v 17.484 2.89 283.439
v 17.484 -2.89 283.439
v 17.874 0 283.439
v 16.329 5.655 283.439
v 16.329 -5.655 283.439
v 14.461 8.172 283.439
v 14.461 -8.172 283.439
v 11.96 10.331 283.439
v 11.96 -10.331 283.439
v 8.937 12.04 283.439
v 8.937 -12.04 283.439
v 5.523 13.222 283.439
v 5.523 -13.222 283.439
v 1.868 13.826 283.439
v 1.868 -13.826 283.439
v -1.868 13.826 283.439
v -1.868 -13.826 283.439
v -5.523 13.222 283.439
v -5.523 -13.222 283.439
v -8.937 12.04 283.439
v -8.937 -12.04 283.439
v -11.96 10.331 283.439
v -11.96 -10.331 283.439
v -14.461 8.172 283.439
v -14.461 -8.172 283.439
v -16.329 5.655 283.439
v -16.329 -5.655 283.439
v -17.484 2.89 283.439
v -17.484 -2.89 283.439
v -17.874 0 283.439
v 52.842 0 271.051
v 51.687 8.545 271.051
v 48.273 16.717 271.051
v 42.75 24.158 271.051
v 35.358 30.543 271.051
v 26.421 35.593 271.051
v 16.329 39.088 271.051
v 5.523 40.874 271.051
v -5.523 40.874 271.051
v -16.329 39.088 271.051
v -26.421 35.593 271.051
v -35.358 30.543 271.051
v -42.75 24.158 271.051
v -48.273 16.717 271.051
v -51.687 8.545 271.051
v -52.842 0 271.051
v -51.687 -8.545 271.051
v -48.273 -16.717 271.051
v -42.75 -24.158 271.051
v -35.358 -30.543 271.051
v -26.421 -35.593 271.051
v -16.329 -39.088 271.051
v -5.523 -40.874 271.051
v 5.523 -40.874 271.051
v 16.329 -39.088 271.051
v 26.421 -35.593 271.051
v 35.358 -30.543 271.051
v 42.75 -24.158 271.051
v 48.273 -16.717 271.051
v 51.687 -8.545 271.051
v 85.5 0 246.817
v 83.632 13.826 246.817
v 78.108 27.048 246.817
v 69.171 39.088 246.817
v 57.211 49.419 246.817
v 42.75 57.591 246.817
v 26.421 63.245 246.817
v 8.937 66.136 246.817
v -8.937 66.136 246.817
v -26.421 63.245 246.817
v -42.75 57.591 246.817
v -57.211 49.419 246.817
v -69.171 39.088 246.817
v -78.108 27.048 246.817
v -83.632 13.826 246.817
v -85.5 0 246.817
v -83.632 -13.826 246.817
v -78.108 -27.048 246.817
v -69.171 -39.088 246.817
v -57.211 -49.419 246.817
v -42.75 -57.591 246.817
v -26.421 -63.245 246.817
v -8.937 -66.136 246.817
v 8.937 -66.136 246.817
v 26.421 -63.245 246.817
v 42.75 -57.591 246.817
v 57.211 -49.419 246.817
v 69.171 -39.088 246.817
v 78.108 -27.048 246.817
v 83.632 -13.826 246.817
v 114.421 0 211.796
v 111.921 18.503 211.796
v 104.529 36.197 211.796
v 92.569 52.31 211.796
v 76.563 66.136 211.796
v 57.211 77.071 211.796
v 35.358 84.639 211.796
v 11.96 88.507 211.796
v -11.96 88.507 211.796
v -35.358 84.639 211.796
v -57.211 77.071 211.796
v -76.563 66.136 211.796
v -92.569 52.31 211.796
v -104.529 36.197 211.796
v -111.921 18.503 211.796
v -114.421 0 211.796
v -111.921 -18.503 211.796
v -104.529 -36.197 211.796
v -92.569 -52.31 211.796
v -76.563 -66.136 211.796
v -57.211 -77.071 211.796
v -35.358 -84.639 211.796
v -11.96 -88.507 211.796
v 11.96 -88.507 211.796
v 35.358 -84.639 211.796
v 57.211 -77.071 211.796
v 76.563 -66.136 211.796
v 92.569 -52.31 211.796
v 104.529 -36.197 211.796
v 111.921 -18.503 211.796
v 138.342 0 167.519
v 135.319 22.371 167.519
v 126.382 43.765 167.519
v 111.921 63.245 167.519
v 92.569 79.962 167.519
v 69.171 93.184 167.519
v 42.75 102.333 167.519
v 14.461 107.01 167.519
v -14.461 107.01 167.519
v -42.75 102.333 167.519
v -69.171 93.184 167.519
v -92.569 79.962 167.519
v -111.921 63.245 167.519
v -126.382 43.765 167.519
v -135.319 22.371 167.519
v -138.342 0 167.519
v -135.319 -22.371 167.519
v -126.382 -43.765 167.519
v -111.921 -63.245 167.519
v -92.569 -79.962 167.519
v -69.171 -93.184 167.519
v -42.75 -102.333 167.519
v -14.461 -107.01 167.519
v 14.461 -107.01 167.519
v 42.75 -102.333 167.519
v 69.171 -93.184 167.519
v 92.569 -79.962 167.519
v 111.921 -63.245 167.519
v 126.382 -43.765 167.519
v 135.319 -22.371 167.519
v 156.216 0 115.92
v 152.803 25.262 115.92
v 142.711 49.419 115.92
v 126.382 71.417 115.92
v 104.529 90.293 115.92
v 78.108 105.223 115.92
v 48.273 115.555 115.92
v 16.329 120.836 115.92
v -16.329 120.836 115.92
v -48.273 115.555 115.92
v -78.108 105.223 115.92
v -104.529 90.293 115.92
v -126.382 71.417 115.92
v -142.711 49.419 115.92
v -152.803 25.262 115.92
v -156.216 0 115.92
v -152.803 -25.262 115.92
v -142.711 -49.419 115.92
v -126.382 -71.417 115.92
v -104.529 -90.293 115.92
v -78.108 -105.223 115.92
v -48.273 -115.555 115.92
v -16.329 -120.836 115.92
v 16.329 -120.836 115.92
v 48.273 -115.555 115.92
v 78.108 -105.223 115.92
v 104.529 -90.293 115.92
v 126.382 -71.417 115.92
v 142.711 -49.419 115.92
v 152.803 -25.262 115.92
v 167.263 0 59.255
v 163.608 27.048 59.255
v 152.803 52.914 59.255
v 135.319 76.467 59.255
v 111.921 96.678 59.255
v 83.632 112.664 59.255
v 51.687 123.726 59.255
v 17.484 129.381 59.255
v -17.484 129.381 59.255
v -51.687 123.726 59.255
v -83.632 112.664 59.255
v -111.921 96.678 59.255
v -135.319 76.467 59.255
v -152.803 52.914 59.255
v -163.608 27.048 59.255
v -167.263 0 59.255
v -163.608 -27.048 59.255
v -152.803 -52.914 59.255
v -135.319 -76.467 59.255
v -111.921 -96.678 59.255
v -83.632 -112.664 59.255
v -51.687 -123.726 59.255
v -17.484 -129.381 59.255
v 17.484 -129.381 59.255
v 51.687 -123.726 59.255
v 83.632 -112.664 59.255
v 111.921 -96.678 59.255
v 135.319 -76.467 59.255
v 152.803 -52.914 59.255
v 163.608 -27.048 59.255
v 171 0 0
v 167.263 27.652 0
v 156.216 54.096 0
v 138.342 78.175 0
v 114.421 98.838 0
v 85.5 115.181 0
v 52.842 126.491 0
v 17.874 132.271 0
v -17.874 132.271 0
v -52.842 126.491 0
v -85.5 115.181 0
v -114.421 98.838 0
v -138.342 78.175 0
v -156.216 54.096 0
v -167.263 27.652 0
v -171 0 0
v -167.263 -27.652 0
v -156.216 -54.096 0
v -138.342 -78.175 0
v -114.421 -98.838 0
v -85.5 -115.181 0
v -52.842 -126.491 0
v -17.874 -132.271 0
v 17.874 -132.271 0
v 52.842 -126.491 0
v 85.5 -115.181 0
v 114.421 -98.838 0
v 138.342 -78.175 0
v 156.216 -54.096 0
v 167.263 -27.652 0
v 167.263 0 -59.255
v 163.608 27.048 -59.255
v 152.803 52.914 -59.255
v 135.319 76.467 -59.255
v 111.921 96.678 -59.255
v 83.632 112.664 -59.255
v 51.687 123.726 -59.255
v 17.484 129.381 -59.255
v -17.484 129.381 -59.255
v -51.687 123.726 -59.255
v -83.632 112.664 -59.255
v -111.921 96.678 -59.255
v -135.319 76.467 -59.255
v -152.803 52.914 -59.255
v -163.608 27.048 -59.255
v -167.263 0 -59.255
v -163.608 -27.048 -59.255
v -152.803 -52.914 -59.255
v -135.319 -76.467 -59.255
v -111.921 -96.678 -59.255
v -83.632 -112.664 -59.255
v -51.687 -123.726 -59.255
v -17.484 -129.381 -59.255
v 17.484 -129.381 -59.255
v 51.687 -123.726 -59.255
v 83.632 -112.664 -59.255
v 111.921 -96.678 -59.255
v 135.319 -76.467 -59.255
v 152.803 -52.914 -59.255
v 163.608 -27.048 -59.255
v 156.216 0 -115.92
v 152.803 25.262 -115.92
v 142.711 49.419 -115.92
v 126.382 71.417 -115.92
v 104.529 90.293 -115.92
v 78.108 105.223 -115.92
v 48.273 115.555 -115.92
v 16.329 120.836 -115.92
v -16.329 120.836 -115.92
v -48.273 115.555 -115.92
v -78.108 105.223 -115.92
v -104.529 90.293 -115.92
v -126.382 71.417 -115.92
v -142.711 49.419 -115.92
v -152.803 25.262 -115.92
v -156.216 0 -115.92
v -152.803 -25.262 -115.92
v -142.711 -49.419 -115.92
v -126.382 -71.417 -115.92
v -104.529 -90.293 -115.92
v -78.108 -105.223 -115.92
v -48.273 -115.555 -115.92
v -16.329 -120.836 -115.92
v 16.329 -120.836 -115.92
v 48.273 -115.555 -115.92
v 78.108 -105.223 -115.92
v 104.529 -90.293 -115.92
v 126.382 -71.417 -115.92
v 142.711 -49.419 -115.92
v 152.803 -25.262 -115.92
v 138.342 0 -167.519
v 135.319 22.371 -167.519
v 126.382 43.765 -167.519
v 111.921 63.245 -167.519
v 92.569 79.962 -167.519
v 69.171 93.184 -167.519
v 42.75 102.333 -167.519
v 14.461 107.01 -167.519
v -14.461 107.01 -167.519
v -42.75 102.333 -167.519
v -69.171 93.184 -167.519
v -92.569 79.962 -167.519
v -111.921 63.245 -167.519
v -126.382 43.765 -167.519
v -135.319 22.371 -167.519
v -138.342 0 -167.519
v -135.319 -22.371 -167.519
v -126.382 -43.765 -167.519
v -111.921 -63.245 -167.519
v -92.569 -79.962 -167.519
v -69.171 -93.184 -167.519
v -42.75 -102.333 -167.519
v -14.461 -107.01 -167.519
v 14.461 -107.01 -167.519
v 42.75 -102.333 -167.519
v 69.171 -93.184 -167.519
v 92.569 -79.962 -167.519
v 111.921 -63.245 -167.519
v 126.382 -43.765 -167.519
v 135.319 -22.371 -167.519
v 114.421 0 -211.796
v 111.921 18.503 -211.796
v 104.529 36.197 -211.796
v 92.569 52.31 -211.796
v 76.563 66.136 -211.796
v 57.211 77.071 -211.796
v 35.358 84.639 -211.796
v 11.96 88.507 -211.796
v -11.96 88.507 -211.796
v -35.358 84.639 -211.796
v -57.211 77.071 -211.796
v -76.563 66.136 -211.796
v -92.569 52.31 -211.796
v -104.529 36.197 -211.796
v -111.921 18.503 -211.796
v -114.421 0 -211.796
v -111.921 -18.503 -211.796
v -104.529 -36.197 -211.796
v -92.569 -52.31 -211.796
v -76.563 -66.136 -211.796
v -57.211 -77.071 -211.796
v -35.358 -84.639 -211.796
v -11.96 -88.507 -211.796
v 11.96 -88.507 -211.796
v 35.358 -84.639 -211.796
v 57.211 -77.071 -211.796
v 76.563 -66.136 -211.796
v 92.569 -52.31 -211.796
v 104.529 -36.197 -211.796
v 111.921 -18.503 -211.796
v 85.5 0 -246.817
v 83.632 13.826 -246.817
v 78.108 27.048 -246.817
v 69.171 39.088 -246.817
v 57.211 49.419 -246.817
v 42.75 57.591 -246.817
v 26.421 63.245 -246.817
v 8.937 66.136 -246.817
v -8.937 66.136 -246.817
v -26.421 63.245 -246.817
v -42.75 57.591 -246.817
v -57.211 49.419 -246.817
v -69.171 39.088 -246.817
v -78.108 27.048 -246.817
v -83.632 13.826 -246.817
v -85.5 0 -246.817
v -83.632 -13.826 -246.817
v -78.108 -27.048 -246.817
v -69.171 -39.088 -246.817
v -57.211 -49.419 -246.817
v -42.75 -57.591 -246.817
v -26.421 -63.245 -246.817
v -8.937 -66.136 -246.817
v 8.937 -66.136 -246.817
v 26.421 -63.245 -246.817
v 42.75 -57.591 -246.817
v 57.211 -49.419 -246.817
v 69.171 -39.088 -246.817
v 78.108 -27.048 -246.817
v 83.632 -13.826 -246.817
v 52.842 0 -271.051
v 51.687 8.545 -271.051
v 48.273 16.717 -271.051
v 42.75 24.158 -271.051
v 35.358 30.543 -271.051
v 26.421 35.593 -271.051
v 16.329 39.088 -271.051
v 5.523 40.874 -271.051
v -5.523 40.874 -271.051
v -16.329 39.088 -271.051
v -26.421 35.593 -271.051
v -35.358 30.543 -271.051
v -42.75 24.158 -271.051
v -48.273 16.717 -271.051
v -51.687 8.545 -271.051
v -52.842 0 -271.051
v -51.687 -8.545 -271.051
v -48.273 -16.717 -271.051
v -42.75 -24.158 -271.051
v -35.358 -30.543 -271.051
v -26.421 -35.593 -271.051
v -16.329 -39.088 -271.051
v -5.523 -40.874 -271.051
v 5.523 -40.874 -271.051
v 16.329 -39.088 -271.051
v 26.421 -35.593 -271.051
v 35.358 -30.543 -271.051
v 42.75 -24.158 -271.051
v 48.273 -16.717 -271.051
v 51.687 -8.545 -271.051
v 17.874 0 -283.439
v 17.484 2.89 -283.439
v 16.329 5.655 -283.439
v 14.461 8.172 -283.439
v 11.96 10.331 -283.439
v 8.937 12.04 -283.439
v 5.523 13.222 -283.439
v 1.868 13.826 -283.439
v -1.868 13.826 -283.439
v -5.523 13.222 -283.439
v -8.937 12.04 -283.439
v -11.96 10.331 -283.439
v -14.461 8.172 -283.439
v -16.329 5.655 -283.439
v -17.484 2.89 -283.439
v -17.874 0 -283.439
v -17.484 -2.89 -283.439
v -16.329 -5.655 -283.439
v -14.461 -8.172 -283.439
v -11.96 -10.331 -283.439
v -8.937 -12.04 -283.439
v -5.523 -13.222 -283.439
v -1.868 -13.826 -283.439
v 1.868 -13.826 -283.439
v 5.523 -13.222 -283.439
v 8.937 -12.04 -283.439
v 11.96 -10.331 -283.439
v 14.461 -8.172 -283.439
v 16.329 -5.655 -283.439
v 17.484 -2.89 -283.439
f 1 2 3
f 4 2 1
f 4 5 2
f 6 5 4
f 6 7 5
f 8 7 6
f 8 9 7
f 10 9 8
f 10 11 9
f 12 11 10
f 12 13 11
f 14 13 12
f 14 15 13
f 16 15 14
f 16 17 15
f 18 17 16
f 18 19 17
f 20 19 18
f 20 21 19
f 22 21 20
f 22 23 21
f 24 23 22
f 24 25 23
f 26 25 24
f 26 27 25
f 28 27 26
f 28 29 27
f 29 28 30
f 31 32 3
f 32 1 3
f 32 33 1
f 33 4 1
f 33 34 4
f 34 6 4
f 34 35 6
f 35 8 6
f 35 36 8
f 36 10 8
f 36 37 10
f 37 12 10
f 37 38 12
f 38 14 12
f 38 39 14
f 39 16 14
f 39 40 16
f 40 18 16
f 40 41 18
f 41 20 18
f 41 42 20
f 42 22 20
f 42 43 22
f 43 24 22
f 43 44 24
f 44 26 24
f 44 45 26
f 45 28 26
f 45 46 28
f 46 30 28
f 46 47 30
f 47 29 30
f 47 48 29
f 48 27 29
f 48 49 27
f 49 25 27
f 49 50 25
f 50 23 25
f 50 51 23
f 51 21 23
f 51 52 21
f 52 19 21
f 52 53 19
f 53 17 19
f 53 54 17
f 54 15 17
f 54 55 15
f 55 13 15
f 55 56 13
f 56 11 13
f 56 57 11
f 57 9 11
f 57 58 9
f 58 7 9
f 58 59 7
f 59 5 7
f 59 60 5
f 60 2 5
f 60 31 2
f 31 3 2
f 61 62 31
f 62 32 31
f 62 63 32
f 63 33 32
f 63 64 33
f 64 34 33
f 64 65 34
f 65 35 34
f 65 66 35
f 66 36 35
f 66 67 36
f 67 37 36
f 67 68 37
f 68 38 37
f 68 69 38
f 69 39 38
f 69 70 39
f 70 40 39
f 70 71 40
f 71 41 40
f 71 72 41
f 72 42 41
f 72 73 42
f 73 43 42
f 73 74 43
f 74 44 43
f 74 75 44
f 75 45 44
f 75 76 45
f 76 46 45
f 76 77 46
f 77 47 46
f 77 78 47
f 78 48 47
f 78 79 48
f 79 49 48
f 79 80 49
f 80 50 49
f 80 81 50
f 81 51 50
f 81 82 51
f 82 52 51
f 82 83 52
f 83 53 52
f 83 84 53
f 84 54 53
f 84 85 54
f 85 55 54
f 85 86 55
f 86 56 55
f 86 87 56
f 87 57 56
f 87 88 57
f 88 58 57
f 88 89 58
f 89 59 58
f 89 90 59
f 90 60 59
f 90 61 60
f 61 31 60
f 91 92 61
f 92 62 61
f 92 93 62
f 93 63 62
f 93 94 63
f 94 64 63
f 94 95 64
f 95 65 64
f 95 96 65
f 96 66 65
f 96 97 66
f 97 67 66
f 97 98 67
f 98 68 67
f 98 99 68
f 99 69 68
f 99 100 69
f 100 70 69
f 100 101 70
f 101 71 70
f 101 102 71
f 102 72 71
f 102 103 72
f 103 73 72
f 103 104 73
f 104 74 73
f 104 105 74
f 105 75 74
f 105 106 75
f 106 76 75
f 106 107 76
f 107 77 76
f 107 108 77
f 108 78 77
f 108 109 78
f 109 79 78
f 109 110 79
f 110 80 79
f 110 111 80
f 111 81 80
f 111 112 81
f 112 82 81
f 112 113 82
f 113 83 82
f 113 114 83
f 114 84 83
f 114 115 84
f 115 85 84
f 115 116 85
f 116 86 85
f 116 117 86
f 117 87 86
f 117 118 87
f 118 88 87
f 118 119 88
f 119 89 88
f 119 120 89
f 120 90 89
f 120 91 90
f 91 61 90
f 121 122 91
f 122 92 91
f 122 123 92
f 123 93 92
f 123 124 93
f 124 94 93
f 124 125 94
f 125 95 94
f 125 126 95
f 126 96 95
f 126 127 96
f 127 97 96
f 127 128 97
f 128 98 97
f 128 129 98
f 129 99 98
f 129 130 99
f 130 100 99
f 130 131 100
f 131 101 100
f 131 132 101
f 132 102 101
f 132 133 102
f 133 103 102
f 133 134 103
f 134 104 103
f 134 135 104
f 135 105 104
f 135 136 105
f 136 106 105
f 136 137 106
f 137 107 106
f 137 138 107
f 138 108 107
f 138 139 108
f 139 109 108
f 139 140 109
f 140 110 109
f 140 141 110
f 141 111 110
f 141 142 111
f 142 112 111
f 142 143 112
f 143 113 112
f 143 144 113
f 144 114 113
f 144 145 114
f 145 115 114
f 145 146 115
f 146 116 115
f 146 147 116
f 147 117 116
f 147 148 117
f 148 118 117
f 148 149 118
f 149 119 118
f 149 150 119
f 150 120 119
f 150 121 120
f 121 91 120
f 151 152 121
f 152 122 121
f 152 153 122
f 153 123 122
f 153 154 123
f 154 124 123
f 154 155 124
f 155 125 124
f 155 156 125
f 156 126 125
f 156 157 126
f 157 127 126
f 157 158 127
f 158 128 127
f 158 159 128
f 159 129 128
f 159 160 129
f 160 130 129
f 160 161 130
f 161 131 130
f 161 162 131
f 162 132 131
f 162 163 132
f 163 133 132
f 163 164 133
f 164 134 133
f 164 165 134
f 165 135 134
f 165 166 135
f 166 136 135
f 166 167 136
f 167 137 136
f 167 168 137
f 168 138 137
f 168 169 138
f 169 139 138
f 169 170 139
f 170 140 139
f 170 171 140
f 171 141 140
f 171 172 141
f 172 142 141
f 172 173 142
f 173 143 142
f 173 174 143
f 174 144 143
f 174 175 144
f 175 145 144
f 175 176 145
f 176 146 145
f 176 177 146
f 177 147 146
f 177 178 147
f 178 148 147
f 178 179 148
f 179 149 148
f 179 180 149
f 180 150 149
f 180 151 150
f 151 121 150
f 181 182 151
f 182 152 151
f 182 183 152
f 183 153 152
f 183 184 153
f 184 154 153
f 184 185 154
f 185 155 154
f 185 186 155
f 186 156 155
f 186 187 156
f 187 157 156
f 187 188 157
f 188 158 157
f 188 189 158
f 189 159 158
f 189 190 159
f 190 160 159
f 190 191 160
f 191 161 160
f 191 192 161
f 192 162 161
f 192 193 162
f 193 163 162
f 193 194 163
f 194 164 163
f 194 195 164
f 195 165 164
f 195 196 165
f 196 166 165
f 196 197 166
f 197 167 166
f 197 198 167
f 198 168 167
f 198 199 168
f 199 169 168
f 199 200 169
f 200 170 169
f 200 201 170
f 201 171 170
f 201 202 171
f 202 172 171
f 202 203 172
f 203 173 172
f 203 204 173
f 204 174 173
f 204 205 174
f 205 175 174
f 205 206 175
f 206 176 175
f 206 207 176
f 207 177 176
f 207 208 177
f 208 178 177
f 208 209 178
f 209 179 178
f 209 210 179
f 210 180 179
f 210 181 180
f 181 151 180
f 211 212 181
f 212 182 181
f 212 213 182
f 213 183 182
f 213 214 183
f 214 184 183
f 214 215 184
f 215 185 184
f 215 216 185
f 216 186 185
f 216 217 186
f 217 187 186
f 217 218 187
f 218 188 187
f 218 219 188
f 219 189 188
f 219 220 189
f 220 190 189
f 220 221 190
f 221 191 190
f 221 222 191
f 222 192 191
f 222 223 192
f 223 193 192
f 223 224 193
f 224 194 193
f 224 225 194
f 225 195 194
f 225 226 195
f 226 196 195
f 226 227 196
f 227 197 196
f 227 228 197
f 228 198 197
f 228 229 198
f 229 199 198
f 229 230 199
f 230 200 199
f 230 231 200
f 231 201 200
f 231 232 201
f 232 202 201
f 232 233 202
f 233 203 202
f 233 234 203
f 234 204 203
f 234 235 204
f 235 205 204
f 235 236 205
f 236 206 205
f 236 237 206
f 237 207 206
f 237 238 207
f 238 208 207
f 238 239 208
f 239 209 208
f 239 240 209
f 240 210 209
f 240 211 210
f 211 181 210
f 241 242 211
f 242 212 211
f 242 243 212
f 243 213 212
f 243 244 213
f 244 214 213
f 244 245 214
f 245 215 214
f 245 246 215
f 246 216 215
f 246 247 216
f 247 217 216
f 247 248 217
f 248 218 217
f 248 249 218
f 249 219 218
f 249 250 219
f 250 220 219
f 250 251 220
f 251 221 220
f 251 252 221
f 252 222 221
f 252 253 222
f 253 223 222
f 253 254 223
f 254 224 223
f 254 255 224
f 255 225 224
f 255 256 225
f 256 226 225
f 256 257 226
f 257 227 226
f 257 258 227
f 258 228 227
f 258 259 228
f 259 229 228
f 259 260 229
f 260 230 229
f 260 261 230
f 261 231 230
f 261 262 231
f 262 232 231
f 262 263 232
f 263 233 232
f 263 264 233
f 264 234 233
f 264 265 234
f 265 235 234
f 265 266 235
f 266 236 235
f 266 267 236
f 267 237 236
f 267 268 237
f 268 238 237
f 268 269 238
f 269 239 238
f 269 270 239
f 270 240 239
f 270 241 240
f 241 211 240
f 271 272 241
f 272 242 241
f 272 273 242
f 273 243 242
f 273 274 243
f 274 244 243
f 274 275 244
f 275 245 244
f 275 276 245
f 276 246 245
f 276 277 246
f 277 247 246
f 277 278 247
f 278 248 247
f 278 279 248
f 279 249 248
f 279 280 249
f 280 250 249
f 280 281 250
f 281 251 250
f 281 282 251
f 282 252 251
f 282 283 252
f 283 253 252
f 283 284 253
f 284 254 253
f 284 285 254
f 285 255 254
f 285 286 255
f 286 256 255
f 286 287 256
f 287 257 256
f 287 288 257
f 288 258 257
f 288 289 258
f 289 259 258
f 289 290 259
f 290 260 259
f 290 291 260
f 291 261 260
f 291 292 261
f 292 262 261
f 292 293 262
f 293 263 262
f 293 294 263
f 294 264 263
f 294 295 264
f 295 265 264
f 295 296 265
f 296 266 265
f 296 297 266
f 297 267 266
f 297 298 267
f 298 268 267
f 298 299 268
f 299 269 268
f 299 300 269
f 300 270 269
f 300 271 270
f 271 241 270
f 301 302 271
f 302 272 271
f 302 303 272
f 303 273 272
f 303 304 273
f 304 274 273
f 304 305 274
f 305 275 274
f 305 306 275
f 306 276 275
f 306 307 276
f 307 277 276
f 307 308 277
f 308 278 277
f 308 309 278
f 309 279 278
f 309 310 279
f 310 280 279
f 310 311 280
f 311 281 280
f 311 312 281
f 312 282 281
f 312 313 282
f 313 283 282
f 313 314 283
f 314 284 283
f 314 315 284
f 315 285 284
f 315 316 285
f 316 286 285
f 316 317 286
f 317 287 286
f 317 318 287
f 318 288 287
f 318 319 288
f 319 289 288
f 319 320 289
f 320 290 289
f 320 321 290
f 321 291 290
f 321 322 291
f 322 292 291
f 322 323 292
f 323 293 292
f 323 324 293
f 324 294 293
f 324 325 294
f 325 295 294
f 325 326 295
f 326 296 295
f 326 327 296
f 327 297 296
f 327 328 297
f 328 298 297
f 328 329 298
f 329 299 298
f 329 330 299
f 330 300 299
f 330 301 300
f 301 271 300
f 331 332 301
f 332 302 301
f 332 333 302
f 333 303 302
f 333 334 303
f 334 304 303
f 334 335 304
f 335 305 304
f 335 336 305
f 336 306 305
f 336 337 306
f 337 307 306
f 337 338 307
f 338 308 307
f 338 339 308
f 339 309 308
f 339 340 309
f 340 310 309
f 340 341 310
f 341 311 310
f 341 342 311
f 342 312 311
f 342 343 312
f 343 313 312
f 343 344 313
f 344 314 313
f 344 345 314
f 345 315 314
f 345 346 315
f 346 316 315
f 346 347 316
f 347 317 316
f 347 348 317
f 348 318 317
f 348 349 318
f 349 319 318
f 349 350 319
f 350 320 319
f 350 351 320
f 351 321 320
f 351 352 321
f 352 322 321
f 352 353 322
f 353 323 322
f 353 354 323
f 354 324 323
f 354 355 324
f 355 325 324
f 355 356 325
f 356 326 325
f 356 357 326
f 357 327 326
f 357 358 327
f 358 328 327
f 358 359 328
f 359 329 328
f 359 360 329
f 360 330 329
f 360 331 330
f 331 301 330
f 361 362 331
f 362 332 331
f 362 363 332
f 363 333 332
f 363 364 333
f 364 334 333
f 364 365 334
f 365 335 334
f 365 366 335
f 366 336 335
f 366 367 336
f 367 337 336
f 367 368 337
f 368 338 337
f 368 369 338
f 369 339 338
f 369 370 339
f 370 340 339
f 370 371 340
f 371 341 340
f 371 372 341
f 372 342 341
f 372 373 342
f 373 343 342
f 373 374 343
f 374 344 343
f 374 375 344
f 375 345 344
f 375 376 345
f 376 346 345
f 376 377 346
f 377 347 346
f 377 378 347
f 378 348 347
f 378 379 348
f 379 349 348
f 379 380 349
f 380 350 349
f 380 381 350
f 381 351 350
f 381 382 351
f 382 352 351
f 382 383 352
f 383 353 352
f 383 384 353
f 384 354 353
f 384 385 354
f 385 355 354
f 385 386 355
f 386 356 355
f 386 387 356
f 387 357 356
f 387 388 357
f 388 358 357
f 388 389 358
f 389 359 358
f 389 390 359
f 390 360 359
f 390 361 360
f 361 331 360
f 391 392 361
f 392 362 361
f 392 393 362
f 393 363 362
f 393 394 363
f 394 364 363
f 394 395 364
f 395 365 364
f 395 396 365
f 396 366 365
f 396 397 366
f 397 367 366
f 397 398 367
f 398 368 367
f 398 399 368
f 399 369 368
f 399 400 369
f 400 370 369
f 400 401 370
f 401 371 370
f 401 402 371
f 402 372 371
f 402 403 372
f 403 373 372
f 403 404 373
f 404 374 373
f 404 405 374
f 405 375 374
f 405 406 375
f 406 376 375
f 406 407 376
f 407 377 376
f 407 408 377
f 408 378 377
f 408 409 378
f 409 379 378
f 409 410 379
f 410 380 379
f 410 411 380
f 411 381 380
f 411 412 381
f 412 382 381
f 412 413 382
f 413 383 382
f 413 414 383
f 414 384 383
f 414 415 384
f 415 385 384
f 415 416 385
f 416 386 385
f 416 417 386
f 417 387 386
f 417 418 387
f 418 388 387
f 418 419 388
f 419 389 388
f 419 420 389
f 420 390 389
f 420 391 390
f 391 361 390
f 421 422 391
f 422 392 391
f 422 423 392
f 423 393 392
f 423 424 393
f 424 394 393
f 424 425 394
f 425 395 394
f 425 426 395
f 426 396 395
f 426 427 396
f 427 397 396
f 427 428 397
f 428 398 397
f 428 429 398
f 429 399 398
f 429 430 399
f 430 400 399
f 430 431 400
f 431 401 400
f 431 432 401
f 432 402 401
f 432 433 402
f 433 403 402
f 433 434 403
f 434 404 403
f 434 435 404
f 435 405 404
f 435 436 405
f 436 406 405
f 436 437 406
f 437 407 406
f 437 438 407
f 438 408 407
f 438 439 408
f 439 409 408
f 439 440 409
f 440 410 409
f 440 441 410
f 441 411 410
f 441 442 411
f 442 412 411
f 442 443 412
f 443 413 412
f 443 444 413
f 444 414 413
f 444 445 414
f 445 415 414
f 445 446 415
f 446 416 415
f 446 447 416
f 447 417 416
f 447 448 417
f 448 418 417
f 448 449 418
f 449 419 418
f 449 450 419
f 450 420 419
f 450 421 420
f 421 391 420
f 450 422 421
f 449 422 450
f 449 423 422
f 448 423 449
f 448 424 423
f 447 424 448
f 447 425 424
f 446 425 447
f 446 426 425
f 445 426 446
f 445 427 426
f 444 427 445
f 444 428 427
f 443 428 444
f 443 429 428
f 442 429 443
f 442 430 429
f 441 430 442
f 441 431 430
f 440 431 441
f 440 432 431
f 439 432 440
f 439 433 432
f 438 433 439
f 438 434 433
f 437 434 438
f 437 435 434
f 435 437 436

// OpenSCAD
// Generated by SolidPython 1.0.1 on 2020-07-29 00:46:48


scale(v = [9, 7, 15]) {
	sphere(r = 19);
}
/***********************************************
*********      SolidPython code:      **********
************************************************
 
# import packages: SolidPython
from solid import *
from solid.utils import *
from itertools import chain, combinations, permutations


class Resize:

    def __init__(self, scad_file):
        self.scad_file = scad_file
        #self.scad_file = import_scad(scad_file)
        # cone/cylinder param:
        self.r1 = 0
        self.r2 = 0
        self.h = 0
        # rectangular prism param:
        self.w = 0
        self.l = 0
        # ellipse param:
        self.r = 0

    # import OpenScad code (file name corresponds to shape)


    # classify shape + parameters
    def assign(self, param1, param2, param3):
        if self.scad_file == 'cone.scad':
            self.r1 = param1
            self.r2 = param2
            self.h = param3
        elif self.scad_file == 'cylinder.scad':
            self.r1 = param1
            self.r2 = param2
            self.h = param3
        elif self.scad_file == 'rectangularPrism.scad':
            self.h = param1
            self.l = param2
            self.w = param3
        else:
            self.r = param1
            self.h = param2

    # resize parameters
    def iterate(self):
        x = range(3, 20, 2)
        i = 1
        if self.scad_file == 'cone.scad':
            tempList = list(permutations(x, 2))
            for temp in tempList:
                param1 = temp[0]
                param2 = temp[1]
                filepath = 'produced_scad_files/' + 'cone' + str(param1) + '_' + str(param2) + '_' + '.scad'
                scad_render_to_file(cylinder(h=param1, r1=param2, r2=0), filepath)

        elif self.scad_file == 'cylinder.scad':
            tempList = list(permutations(x, 3))
            for temp in tempList:
                param1 = temp[0]
                param2 = temp[1]
                filepath = 'produced_scad_files/' + 'cylinder' + str(param1) + '_' + str(param2) + '_' + '.scad'
                scad_render_to_file(cylinder(h=param1, r1=param2, r2=param2), filepath)

        elif self.scad_file == 'rectangularPrism.scad':
            tempList = list(permutations(x, 3))
            for temp in tempList:
                param1 = temp[0]
                param2 = temp[1]
                param3 = temp[2]
                filepath = 'produced_scad_files/' + 'rectangularPrism' + str(param1) + '_' + str(param2) + '_' + str(
                    param3) + '.scad'
                scad_render_to_file(cube(size=(param1, param2, param3)), filepath)

        elif self.scad_file == 'ellipse.scad':
            tempList = list(permutations(x, 4))
            for temp in tempList:
                param1 = temp[0]
                param2 = temp[1]
                param3 = temp[2]
                param4 = temp[3]
                filepath = 'produced_scad_files/' + 'ellipse' + str(param1) + '_' + str(param2) + '_' + str(param3) + '_' + str(param4) + '.scad'
                scad_render_to_file(scale([param1, param2, param3])(sphere(r=param4)), filepath)

    def render_to_scadfile(self):
        scad_render_to_file(scad, 'example.scad') 
 
************************************************/
